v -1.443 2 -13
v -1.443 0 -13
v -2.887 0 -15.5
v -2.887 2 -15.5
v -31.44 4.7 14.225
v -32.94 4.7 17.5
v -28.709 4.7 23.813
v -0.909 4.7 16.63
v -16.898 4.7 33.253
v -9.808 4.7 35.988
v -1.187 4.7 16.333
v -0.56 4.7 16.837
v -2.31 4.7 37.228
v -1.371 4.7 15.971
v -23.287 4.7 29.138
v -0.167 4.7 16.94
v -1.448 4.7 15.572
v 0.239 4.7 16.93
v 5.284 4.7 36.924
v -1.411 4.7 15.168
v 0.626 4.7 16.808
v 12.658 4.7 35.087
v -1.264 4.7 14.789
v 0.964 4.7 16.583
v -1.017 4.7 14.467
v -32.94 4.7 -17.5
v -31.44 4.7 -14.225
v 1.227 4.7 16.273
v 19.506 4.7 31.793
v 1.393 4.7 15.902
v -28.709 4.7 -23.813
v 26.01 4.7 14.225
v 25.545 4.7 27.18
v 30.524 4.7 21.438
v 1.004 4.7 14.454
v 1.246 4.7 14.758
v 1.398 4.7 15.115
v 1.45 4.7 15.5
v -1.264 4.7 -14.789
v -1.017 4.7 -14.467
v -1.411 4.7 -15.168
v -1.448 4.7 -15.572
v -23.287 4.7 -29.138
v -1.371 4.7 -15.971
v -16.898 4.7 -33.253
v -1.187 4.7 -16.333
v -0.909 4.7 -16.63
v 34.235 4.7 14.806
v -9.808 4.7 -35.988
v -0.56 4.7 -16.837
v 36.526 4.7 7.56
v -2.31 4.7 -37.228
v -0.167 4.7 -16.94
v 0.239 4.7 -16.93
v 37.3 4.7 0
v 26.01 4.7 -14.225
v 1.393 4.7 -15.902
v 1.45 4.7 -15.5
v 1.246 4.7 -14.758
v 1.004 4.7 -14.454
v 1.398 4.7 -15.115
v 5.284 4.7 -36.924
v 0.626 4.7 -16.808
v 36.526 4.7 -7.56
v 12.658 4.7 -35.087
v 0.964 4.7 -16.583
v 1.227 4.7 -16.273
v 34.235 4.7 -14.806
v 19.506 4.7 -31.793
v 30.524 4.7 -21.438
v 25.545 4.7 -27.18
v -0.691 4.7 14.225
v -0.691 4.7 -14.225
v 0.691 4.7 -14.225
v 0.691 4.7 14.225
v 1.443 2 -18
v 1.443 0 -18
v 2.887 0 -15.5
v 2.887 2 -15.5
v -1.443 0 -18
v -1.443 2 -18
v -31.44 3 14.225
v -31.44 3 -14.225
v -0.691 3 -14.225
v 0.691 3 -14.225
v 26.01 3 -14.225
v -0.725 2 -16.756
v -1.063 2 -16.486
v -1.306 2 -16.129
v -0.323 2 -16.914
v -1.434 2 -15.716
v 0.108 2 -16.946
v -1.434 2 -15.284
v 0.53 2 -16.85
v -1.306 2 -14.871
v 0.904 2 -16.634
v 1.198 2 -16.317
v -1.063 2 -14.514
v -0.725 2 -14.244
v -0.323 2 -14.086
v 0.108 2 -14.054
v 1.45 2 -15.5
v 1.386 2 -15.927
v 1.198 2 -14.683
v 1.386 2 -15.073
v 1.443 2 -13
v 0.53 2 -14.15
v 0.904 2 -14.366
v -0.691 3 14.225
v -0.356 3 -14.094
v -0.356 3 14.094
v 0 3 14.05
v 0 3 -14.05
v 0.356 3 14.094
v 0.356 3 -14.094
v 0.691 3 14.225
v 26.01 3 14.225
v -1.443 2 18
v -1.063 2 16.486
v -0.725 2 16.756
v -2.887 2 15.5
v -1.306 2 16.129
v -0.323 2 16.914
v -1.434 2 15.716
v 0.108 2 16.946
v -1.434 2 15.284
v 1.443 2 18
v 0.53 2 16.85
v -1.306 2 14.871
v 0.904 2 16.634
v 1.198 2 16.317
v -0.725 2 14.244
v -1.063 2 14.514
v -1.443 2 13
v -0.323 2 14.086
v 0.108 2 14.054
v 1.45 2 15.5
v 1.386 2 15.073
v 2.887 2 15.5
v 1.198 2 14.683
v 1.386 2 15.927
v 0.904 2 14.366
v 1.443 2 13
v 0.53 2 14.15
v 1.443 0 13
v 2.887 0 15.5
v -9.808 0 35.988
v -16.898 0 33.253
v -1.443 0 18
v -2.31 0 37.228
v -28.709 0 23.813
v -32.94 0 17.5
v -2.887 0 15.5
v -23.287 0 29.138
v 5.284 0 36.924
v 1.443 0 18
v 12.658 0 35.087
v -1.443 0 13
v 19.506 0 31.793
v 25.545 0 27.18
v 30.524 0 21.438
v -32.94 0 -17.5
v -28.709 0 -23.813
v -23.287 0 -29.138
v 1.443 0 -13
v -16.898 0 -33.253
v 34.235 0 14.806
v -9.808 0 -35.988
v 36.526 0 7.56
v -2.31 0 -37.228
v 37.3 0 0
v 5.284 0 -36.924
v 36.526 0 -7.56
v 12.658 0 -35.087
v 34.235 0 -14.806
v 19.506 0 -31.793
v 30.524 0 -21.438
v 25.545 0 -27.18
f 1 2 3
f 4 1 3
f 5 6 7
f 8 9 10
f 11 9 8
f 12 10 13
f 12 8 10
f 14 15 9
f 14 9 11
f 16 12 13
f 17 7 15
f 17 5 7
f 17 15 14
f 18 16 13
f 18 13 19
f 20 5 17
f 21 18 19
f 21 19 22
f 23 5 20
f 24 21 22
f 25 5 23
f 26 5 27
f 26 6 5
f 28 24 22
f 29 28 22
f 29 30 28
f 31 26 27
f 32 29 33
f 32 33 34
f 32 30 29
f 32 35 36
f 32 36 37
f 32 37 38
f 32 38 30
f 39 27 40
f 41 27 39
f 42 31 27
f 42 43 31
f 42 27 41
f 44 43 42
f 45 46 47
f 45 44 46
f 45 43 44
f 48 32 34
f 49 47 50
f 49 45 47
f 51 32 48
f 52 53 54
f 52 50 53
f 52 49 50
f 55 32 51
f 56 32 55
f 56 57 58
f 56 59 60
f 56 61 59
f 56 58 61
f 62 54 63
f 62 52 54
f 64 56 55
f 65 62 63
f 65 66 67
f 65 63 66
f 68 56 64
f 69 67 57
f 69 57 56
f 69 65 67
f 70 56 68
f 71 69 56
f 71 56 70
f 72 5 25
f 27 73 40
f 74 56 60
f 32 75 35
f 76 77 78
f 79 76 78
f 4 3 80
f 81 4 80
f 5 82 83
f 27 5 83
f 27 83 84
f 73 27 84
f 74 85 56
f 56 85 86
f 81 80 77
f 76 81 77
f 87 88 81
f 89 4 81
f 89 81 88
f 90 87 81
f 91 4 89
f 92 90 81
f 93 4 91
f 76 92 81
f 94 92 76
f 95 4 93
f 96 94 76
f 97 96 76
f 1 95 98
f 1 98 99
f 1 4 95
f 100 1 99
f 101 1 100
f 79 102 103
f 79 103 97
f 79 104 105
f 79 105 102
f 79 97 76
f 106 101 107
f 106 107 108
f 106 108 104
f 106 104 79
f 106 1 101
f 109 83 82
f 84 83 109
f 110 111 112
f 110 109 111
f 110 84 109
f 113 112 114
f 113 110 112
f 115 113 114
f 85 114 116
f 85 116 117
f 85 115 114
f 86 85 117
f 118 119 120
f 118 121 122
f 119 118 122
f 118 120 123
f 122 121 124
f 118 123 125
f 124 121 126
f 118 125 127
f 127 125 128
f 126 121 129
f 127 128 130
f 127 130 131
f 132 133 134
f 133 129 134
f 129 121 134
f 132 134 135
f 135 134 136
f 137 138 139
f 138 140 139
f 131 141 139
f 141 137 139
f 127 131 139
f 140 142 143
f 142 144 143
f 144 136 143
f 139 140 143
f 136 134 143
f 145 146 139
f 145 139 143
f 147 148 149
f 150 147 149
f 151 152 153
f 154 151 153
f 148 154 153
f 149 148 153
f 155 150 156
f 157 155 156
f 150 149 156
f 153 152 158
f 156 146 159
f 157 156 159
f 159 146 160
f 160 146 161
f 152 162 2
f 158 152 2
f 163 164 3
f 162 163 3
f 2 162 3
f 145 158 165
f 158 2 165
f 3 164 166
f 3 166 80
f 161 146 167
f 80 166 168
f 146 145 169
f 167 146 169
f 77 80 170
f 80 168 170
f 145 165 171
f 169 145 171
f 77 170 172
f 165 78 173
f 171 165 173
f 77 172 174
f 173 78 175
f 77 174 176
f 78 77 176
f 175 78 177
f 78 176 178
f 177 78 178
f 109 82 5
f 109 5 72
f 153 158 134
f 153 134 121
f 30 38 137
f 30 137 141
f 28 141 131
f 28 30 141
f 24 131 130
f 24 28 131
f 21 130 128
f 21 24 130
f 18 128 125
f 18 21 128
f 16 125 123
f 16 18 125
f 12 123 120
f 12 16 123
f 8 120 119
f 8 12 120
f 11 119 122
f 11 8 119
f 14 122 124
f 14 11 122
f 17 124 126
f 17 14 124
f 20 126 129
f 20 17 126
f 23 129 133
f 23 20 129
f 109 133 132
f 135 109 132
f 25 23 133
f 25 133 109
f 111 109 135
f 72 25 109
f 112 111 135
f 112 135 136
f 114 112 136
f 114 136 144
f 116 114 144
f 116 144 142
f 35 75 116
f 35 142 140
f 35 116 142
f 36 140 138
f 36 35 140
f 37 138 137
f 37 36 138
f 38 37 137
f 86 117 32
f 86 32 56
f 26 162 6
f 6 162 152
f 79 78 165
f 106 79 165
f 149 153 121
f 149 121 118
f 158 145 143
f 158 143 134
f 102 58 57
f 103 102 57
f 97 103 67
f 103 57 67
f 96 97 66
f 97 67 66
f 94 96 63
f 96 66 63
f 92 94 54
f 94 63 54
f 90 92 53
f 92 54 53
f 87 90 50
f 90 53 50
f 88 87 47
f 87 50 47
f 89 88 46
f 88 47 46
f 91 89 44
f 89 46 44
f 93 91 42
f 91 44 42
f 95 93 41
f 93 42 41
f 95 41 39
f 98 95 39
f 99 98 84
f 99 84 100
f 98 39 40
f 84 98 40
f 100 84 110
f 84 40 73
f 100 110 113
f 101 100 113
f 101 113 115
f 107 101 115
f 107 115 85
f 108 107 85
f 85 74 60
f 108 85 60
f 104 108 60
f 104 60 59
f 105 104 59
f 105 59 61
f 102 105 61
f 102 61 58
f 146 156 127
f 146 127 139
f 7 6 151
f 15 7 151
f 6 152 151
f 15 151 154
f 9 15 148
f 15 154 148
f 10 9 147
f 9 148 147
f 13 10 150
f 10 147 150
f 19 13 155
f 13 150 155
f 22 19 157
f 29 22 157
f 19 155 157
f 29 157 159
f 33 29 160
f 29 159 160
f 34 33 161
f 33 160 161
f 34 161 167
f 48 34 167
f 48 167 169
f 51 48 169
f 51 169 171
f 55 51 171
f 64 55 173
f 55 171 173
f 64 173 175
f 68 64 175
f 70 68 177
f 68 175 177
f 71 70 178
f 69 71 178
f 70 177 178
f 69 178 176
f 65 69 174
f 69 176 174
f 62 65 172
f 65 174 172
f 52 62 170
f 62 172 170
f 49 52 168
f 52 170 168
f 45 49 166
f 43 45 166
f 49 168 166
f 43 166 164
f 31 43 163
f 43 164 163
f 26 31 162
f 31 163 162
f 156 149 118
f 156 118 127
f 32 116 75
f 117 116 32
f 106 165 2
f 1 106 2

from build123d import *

# Parameters (mm, degrees)
BOSS_EXTRUDE1_DEPTH = 3
SKETCH2_W           = 57.45
SKETCH2_H           = 28.45
BOSS_EXTRUDE2_DEPTH = 1.7
SKETCH3_R           = 1.45
CUT_EXTRUDE1_DEPTH  = 5.7
CUT_EXTRUDE2_DEPTH  = 2


with BuildPart() as part:
    # Sketch1 → Boss-Extrude1 (new body)
    with BuildSketch(Plane(origin=(0, 0, 0), x_dir=(1, 0, 0), z_dir=(0, 1, 0))):
        with BuildLine():
            Line((-32.939945355, 17.5), (-32.939945355, -17.5))
            ThreePointArc((-32.939945355, -17.5), (37.3, 0), (-32.939945355, 17.5))
        make_face()
    extrude(amount=BOSS_EXTRUDE1_DEPTH)

    # Sketch2 → Boss-Extrude2 (add)
    with BuildSketch(Plane(origin=(0, 3, 0), x_dir=(1, 0, 0), z_dir=(0, 1, 0))):
        with BuildLine():
            Line((-32.939945355, 17.5), (-32.939945355, -17.5))
            ThreePointArc((-32.939945355, -17.5), (37.3, 0), (-32.939945355, 17.5))
        make_face()
        with Locations((-2.714945355, 0)):
            Rectangle(SKETCH2_W, SKETCH2_H, mode=Mode.SUBTRACT)
    extrude(amount=BOSS_EXTRUDE2_DEPTH)

    # Sketch3 → Cut-Extrude1 (cut, through all)
    with BuildSketch(Plane(origin=(0, 4.7, 0), x_dir=(1, 0, 0), z_dir=(0, 1, 0))):
        with Locations((0, 15.5)):
            Circle(SKETCH3_R)
    cut_extrude1 = extrude(amount=-CUT_EXTRUDE1_DEPTH, mode=Mode.SUBTRACT)

    # Sketch4 → Cut-Extrude2 (cut)
    with BuildSketch(Plane.XZ):
        Polygon((2.886751346, -15.5), (1.443375673, -13), (-1.443375673, -13), (-2.886751346, -15.5), (-1.443375673, -18), (1.443375673, -18), align=None)
    cut_extrude2 = extrude(amount=-CUT_EXTRUDE2_DEPTH, mode=Mode.SUBTRACT)

    # Mirror2: Cut-Extrude1, Cut-Extrude2 across plane
    add(cut_extrude1.mirror(Plane.XY), mode=Mode.SUBTRACT)
    add(cut_extrude2.mirror(Plane.XY), mode=Mode.SUBTRACT)


solid = part.part
